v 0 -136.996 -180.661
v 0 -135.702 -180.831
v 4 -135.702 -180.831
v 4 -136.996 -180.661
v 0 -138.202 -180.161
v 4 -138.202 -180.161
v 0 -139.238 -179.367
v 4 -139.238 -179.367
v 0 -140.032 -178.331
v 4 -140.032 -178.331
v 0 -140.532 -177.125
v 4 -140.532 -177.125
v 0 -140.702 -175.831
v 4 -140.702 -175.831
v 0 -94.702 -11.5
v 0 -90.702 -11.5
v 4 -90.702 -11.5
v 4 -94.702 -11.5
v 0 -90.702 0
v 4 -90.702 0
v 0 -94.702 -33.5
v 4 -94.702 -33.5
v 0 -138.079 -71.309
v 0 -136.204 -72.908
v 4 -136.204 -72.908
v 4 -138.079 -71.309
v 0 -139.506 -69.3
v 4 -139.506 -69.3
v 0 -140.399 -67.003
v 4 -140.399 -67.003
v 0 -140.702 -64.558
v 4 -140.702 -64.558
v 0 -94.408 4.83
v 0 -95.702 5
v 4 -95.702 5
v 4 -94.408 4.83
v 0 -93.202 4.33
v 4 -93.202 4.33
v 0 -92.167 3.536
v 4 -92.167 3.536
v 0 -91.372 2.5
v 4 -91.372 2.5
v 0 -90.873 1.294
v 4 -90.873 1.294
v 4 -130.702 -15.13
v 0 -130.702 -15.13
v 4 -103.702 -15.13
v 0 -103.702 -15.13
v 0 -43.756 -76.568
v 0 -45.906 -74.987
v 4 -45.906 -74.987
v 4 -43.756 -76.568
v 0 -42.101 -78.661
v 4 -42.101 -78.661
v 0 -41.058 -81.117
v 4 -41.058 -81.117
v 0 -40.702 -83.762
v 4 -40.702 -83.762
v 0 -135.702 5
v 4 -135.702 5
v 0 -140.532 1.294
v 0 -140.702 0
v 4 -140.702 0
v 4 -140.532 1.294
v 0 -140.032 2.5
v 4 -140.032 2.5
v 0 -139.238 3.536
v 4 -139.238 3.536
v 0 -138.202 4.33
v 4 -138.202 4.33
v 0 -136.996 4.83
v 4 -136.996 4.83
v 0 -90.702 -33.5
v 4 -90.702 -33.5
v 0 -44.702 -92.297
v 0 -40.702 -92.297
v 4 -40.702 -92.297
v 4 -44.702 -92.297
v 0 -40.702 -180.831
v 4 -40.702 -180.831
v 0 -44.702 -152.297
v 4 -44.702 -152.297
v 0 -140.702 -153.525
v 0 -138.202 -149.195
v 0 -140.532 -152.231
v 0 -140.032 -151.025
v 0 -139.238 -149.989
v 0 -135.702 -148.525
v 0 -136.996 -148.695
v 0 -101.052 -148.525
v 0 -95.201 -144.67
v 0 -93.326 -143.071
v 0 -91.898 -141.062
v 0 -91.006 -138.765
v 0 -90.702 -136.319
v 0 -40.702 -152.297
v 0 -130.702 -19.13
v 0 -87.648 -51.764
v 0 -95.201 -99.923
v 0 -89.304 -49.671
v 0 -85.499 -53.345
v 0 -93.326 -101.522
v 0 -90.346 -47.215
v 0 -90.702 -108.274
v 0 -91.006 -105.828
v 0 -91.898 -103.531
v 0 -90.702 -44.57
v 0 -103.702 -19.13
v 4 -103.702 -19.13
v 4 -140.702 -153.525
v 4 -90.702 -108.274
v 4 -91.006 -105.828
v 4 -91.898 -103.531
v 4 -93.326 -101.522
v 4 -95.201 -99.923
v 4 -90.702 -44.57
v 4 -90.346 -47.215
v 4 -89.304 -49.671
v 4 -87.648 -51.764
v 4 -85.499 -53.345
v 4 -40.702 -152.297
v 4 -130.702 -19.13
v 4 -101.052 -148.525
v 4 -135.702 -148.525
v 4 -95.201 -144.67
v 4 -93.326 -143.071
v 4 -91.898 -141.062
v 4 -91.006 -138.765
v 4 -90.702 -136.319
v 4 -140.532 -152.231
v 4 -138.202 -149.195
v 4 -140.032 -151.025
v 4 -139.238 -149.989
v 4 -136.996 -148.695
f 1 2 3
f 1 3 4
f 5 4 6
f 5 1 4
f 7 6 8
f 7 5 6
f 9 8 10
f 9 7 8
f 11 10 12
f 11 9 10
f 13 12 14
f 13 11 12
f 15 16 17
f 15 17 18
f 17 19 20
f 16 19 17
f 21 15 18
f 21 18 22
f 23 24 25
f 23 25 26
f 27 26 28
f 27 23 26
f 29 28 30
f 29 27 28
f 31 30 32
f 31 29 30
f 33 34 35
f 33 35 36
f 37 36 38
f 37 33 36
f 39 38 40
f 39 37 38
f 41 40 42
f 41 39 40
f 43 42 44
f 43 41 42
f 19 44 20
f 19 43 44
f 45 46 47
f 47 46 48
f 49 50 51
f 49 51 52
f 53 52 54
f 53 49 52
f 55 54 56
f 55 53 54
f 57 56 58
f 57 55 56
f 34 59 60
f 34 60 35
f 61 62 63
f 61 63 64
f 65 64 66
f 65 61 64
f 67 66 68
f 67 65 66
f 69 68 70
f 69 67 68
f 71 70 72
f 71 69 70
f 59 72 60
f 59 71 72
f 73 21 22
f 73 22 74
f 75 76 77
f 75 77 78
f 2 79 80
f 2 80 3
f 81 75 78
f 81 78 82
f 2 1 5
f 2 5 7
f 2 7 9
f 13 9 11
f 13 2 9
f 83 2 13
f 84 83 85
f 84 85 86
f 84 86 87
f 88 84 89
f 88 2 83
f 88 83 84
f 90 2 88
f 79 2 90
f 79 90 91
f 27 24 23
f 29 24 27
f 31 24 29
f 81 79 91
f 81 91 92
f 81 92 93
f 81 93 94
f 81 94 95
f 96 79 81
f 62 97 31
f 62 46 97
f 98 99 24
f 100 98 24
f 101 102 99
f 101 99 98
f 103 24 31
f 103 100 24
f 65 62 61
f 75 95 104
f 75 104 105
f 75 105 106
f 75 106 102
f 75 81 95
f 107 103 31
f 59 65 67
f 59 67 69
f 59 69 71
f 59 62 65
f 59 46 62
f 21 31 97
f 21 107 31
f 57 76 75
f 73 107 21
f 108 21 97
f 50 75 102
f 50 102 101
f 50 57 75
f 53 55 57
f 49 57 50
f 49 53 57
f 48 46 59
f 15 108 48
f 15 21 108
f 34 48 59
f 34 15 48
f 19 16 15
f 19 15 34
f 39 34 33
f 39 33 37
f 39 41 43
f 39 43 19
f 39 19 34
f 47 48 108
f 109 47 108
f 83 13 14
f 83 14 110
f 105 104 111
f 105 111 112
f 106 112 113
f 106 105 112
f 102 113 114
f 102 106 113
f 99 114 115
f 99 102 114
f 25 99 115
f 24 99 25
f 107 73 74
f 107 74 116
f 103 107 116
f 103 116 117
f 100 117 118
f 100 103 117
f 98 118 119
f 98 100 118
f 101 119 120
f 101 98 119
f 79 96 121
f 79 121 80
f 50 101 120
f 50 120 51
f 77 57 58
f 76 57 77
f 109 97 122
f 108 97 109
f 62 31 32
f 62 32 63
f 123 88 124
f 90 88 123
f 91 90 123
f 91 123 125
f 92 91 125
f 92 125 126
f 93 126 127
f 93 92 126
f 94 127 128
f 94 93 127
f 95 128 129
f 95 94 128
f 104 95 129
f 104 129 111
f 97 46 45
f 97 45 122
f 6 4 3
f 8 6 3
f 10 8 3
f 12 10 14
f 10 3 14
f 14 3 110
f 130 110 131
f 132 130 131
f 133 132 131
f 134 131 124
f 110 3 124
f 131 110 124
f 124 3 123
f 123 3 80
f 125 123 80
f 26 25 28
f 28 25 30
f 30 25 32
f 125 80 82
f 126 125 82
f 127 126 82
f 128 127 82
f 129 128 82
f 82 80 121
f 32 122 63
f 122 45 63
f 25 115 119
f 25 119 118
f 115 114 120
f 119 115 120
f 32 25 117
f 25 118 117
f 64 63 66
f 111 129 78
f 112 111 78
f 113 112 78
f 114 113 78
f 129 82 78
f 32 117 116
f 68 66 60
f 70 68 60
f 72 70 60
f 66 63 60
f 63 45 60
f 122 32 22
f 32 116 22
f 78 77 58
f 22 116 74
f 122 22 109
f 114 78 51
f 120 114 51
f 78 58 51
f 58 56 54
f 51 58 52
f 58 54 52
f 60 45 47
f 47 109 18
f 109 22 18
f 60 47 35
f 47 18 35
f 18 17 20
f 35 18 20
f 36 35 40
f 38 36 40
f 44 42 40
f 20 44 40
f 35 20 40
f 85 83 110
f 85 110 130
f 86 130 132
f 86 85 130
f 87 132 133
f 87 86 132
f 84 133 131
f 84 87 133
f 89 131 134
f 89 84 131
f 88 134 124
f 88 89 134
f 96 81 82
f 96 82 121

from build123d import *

# Parameters (mm, degrees)
SKETCH2_W           = 4
SKETCH2_H           = 27
BOSS_EXTRUDE1_DEPTH = 4
CUT_EXTRUDE1_DEPTH  = 10
BOSS_EXTRUDE2_DEPTH = 4


with BuildPart() as part:
    # Sketch2 → Boss-Extrude1 (new body)
    with BuildSketch(Plane(origin=(0, 0, 0), x_dir=(0, 0, -1), z_dir=(1, 0, 0))):
        with BuildLine():
            Line((53.344601804, -85.498776043), (74.987188297, -45.905868036))
            ThreePointArc((74.987188297, -45.905868036), (78.661054663, -42.101027368), (83.761812448, -40.70232204))
            Line((83.761812448, -40.70232204), (92.296503371, -40.70232204))
            Line((92.296503371, -40.70232204), (92.296503371, -44.70232204))
            Line((92.296503371, -44.70232204), (152.296503371, -44.70232204))
            Line((152.296503371, -44.70232204), (152.296503371, -40.70232204))
            Line((152.296503371, -40.70232204), (160.831194294, -40.70232204))
            ThreePointArc((160.831194294, -40.70232204), (165.931952079, -42.101027368), (169.605818445, -45.905868036))
            Line((169.605818445, -45.905868036), (191.248404938, -85.498776043))
            ThreePointArc((191.248404938, -85.498776043), (194.922271304, -89.303616711), (200.023029089, -90.70232204))
            Line((200.023029089, -90.70232204), (206.057918615, -90.70232204))
            Line((206.057918615, -90.70232204), (211.09280814, -90.70232204))
            Line((211.09280814, -90.70232204), (211.09280814, -94.70232204))
            Line((211.09280814, -94.70232204), (233.09280814, -94.70232204))
            Line((233.09280814, -94.70232204), (233.09280814, -90.70232204))
            Line((233.09280814, -90.70232204), (244.938223676, -90.70232204))
            ThreePointArc((244.938223676, -90.70232204), (248.5155042, -92.209033609), (249.936812742, -95.821096417))
            Line((249.936812742, -95.821096417), (248.986349517, -135.821096417))
            ThreePointArc((248.986349517, -135.821096417), (247.481048882, -139.279602563), (243.987760452, -140.70232204))
            Line((243.987760452, -140.70232204), (180.035244387, -140.70232204))
            ThreePointArc((180.035244387, -140.70232204), (175.292734587, -139.506218949), (171.684730912, -136.204042199))
            Line((171.684730912, -136.204042199), (144.669691073, -95.20060188))
            ThreePointArc((144.669691073, -95.20060188), (141.061687399, -91.89842513), (136.319177599, -90.70232204))
            Line((136.319177599, -90.70232204), (108.273829143, -90.70232204))
            ThreePointArc((108.273829143, -90.70232204), (103.531319343, -91.89842513), (99.923315669, -95.20060188))
            Line((99.923315669, -95.20060188), (72.90827583, -136.204042199))
            ThreePointArc((72.90827583, -136.204042199), (69.300272155, -139.506218949), (64.557762355, -140.70232204))
            Line((64.557762355, -140.70232204), (0, -140.70232204))
            ThreePointArc((0, -140.70232204), (-3.535533906, -139.237855945), (-5, -135.70232204))
            Line((-5, -135.70232204), (-5, -95.70232204))
            ThreePointArc((-5, -95.70232204), (-3.535533906, -92.166788134), (0, -90.70232204))
            Line((0, -90.70232204), (11.500198602, -90.70232204))
            Line((11.500198602, -90.70232204), (11.500198602, -94.70232204))
            Line((11.500198602, -94.70232204), (33.500198602, -94.70232204))
            Line((33.500198602, -94.70232204), (33.500198602, -90.70232204))
            Line((33.500198602, -90.70232204), (38.535088127, -90.70232204))
            Line((38.535088127, -90.70232204), (44.569977653, -90.70232204))
            ThreePointArc((44.569977653, -90.70232204), (49.670735438, -89.303616711), (53.344601804, -85.498776043))
        make_face()
        with Locations((227.463006742, -117.20232204)):
            Rectangle(SKETCH2_W, SKETCH2_H, mode=Mode.SUBTRACT)
        with Locations((17.13, -117.20232204)):
            Rectangle(SKETCH2_W, SKETCH2_H, mode=Mode.SUBTRACT)
    extrude(amount=BOSS_EXTRUDE1_DEPTH)

    # Sketch3 → Cut-Extrude1 (cut)
    with BuildSketch(Plane(origin=(0, 0, 0), x_dir=(0, 0, -1), z_dir=(1, 0, 0))):
        Polygon((160.831194294, -40.70232204), (160.831194294, -144.460869934), (257.875348239, -144.460869934), (257.875348239, -25.544082069), (160.831194294, -34.903829247), align=None)
    extrude(amount=CUT_EXTRUDE1_DEPTH, mode=Mode.SUBTRACT)

    # Sketch4 → Boss-Extrude2 (add)
    with BuildSketch(Plane(origin=(0, 0, 0), x_dir=(0, 0, -1), z_dir=(1, 0, 0))):
        with BuildLine():
            Line((160.831194294, -40.70232204), (180.831194294, -40.70232204))
            Line((180.831194294, -40.70232204), (180.831194294, -135.70232204))
            ThreePointArc((180.831194294, -135.70232204), (179.3667282, -139.237855945), (175.831194294, -140.70232204))
            Line((175.831194294, -140.70232204), (153.525004458, -140.70232204))
            ThreePointArc((153.525004458, -140.70232204), (149.989470552, -139.237855945), (148.525004458, -135.70232204))
            Line((148.525004458, -135.70232204), (148.525004458, -101.052198369))
            Line((148.525004458, -101.052198369), (160.831194294, -40.70232204))
        make_face()
    extrude(amount=BOSS_EXTRUDE2_DEPTH)


solid = part.part
